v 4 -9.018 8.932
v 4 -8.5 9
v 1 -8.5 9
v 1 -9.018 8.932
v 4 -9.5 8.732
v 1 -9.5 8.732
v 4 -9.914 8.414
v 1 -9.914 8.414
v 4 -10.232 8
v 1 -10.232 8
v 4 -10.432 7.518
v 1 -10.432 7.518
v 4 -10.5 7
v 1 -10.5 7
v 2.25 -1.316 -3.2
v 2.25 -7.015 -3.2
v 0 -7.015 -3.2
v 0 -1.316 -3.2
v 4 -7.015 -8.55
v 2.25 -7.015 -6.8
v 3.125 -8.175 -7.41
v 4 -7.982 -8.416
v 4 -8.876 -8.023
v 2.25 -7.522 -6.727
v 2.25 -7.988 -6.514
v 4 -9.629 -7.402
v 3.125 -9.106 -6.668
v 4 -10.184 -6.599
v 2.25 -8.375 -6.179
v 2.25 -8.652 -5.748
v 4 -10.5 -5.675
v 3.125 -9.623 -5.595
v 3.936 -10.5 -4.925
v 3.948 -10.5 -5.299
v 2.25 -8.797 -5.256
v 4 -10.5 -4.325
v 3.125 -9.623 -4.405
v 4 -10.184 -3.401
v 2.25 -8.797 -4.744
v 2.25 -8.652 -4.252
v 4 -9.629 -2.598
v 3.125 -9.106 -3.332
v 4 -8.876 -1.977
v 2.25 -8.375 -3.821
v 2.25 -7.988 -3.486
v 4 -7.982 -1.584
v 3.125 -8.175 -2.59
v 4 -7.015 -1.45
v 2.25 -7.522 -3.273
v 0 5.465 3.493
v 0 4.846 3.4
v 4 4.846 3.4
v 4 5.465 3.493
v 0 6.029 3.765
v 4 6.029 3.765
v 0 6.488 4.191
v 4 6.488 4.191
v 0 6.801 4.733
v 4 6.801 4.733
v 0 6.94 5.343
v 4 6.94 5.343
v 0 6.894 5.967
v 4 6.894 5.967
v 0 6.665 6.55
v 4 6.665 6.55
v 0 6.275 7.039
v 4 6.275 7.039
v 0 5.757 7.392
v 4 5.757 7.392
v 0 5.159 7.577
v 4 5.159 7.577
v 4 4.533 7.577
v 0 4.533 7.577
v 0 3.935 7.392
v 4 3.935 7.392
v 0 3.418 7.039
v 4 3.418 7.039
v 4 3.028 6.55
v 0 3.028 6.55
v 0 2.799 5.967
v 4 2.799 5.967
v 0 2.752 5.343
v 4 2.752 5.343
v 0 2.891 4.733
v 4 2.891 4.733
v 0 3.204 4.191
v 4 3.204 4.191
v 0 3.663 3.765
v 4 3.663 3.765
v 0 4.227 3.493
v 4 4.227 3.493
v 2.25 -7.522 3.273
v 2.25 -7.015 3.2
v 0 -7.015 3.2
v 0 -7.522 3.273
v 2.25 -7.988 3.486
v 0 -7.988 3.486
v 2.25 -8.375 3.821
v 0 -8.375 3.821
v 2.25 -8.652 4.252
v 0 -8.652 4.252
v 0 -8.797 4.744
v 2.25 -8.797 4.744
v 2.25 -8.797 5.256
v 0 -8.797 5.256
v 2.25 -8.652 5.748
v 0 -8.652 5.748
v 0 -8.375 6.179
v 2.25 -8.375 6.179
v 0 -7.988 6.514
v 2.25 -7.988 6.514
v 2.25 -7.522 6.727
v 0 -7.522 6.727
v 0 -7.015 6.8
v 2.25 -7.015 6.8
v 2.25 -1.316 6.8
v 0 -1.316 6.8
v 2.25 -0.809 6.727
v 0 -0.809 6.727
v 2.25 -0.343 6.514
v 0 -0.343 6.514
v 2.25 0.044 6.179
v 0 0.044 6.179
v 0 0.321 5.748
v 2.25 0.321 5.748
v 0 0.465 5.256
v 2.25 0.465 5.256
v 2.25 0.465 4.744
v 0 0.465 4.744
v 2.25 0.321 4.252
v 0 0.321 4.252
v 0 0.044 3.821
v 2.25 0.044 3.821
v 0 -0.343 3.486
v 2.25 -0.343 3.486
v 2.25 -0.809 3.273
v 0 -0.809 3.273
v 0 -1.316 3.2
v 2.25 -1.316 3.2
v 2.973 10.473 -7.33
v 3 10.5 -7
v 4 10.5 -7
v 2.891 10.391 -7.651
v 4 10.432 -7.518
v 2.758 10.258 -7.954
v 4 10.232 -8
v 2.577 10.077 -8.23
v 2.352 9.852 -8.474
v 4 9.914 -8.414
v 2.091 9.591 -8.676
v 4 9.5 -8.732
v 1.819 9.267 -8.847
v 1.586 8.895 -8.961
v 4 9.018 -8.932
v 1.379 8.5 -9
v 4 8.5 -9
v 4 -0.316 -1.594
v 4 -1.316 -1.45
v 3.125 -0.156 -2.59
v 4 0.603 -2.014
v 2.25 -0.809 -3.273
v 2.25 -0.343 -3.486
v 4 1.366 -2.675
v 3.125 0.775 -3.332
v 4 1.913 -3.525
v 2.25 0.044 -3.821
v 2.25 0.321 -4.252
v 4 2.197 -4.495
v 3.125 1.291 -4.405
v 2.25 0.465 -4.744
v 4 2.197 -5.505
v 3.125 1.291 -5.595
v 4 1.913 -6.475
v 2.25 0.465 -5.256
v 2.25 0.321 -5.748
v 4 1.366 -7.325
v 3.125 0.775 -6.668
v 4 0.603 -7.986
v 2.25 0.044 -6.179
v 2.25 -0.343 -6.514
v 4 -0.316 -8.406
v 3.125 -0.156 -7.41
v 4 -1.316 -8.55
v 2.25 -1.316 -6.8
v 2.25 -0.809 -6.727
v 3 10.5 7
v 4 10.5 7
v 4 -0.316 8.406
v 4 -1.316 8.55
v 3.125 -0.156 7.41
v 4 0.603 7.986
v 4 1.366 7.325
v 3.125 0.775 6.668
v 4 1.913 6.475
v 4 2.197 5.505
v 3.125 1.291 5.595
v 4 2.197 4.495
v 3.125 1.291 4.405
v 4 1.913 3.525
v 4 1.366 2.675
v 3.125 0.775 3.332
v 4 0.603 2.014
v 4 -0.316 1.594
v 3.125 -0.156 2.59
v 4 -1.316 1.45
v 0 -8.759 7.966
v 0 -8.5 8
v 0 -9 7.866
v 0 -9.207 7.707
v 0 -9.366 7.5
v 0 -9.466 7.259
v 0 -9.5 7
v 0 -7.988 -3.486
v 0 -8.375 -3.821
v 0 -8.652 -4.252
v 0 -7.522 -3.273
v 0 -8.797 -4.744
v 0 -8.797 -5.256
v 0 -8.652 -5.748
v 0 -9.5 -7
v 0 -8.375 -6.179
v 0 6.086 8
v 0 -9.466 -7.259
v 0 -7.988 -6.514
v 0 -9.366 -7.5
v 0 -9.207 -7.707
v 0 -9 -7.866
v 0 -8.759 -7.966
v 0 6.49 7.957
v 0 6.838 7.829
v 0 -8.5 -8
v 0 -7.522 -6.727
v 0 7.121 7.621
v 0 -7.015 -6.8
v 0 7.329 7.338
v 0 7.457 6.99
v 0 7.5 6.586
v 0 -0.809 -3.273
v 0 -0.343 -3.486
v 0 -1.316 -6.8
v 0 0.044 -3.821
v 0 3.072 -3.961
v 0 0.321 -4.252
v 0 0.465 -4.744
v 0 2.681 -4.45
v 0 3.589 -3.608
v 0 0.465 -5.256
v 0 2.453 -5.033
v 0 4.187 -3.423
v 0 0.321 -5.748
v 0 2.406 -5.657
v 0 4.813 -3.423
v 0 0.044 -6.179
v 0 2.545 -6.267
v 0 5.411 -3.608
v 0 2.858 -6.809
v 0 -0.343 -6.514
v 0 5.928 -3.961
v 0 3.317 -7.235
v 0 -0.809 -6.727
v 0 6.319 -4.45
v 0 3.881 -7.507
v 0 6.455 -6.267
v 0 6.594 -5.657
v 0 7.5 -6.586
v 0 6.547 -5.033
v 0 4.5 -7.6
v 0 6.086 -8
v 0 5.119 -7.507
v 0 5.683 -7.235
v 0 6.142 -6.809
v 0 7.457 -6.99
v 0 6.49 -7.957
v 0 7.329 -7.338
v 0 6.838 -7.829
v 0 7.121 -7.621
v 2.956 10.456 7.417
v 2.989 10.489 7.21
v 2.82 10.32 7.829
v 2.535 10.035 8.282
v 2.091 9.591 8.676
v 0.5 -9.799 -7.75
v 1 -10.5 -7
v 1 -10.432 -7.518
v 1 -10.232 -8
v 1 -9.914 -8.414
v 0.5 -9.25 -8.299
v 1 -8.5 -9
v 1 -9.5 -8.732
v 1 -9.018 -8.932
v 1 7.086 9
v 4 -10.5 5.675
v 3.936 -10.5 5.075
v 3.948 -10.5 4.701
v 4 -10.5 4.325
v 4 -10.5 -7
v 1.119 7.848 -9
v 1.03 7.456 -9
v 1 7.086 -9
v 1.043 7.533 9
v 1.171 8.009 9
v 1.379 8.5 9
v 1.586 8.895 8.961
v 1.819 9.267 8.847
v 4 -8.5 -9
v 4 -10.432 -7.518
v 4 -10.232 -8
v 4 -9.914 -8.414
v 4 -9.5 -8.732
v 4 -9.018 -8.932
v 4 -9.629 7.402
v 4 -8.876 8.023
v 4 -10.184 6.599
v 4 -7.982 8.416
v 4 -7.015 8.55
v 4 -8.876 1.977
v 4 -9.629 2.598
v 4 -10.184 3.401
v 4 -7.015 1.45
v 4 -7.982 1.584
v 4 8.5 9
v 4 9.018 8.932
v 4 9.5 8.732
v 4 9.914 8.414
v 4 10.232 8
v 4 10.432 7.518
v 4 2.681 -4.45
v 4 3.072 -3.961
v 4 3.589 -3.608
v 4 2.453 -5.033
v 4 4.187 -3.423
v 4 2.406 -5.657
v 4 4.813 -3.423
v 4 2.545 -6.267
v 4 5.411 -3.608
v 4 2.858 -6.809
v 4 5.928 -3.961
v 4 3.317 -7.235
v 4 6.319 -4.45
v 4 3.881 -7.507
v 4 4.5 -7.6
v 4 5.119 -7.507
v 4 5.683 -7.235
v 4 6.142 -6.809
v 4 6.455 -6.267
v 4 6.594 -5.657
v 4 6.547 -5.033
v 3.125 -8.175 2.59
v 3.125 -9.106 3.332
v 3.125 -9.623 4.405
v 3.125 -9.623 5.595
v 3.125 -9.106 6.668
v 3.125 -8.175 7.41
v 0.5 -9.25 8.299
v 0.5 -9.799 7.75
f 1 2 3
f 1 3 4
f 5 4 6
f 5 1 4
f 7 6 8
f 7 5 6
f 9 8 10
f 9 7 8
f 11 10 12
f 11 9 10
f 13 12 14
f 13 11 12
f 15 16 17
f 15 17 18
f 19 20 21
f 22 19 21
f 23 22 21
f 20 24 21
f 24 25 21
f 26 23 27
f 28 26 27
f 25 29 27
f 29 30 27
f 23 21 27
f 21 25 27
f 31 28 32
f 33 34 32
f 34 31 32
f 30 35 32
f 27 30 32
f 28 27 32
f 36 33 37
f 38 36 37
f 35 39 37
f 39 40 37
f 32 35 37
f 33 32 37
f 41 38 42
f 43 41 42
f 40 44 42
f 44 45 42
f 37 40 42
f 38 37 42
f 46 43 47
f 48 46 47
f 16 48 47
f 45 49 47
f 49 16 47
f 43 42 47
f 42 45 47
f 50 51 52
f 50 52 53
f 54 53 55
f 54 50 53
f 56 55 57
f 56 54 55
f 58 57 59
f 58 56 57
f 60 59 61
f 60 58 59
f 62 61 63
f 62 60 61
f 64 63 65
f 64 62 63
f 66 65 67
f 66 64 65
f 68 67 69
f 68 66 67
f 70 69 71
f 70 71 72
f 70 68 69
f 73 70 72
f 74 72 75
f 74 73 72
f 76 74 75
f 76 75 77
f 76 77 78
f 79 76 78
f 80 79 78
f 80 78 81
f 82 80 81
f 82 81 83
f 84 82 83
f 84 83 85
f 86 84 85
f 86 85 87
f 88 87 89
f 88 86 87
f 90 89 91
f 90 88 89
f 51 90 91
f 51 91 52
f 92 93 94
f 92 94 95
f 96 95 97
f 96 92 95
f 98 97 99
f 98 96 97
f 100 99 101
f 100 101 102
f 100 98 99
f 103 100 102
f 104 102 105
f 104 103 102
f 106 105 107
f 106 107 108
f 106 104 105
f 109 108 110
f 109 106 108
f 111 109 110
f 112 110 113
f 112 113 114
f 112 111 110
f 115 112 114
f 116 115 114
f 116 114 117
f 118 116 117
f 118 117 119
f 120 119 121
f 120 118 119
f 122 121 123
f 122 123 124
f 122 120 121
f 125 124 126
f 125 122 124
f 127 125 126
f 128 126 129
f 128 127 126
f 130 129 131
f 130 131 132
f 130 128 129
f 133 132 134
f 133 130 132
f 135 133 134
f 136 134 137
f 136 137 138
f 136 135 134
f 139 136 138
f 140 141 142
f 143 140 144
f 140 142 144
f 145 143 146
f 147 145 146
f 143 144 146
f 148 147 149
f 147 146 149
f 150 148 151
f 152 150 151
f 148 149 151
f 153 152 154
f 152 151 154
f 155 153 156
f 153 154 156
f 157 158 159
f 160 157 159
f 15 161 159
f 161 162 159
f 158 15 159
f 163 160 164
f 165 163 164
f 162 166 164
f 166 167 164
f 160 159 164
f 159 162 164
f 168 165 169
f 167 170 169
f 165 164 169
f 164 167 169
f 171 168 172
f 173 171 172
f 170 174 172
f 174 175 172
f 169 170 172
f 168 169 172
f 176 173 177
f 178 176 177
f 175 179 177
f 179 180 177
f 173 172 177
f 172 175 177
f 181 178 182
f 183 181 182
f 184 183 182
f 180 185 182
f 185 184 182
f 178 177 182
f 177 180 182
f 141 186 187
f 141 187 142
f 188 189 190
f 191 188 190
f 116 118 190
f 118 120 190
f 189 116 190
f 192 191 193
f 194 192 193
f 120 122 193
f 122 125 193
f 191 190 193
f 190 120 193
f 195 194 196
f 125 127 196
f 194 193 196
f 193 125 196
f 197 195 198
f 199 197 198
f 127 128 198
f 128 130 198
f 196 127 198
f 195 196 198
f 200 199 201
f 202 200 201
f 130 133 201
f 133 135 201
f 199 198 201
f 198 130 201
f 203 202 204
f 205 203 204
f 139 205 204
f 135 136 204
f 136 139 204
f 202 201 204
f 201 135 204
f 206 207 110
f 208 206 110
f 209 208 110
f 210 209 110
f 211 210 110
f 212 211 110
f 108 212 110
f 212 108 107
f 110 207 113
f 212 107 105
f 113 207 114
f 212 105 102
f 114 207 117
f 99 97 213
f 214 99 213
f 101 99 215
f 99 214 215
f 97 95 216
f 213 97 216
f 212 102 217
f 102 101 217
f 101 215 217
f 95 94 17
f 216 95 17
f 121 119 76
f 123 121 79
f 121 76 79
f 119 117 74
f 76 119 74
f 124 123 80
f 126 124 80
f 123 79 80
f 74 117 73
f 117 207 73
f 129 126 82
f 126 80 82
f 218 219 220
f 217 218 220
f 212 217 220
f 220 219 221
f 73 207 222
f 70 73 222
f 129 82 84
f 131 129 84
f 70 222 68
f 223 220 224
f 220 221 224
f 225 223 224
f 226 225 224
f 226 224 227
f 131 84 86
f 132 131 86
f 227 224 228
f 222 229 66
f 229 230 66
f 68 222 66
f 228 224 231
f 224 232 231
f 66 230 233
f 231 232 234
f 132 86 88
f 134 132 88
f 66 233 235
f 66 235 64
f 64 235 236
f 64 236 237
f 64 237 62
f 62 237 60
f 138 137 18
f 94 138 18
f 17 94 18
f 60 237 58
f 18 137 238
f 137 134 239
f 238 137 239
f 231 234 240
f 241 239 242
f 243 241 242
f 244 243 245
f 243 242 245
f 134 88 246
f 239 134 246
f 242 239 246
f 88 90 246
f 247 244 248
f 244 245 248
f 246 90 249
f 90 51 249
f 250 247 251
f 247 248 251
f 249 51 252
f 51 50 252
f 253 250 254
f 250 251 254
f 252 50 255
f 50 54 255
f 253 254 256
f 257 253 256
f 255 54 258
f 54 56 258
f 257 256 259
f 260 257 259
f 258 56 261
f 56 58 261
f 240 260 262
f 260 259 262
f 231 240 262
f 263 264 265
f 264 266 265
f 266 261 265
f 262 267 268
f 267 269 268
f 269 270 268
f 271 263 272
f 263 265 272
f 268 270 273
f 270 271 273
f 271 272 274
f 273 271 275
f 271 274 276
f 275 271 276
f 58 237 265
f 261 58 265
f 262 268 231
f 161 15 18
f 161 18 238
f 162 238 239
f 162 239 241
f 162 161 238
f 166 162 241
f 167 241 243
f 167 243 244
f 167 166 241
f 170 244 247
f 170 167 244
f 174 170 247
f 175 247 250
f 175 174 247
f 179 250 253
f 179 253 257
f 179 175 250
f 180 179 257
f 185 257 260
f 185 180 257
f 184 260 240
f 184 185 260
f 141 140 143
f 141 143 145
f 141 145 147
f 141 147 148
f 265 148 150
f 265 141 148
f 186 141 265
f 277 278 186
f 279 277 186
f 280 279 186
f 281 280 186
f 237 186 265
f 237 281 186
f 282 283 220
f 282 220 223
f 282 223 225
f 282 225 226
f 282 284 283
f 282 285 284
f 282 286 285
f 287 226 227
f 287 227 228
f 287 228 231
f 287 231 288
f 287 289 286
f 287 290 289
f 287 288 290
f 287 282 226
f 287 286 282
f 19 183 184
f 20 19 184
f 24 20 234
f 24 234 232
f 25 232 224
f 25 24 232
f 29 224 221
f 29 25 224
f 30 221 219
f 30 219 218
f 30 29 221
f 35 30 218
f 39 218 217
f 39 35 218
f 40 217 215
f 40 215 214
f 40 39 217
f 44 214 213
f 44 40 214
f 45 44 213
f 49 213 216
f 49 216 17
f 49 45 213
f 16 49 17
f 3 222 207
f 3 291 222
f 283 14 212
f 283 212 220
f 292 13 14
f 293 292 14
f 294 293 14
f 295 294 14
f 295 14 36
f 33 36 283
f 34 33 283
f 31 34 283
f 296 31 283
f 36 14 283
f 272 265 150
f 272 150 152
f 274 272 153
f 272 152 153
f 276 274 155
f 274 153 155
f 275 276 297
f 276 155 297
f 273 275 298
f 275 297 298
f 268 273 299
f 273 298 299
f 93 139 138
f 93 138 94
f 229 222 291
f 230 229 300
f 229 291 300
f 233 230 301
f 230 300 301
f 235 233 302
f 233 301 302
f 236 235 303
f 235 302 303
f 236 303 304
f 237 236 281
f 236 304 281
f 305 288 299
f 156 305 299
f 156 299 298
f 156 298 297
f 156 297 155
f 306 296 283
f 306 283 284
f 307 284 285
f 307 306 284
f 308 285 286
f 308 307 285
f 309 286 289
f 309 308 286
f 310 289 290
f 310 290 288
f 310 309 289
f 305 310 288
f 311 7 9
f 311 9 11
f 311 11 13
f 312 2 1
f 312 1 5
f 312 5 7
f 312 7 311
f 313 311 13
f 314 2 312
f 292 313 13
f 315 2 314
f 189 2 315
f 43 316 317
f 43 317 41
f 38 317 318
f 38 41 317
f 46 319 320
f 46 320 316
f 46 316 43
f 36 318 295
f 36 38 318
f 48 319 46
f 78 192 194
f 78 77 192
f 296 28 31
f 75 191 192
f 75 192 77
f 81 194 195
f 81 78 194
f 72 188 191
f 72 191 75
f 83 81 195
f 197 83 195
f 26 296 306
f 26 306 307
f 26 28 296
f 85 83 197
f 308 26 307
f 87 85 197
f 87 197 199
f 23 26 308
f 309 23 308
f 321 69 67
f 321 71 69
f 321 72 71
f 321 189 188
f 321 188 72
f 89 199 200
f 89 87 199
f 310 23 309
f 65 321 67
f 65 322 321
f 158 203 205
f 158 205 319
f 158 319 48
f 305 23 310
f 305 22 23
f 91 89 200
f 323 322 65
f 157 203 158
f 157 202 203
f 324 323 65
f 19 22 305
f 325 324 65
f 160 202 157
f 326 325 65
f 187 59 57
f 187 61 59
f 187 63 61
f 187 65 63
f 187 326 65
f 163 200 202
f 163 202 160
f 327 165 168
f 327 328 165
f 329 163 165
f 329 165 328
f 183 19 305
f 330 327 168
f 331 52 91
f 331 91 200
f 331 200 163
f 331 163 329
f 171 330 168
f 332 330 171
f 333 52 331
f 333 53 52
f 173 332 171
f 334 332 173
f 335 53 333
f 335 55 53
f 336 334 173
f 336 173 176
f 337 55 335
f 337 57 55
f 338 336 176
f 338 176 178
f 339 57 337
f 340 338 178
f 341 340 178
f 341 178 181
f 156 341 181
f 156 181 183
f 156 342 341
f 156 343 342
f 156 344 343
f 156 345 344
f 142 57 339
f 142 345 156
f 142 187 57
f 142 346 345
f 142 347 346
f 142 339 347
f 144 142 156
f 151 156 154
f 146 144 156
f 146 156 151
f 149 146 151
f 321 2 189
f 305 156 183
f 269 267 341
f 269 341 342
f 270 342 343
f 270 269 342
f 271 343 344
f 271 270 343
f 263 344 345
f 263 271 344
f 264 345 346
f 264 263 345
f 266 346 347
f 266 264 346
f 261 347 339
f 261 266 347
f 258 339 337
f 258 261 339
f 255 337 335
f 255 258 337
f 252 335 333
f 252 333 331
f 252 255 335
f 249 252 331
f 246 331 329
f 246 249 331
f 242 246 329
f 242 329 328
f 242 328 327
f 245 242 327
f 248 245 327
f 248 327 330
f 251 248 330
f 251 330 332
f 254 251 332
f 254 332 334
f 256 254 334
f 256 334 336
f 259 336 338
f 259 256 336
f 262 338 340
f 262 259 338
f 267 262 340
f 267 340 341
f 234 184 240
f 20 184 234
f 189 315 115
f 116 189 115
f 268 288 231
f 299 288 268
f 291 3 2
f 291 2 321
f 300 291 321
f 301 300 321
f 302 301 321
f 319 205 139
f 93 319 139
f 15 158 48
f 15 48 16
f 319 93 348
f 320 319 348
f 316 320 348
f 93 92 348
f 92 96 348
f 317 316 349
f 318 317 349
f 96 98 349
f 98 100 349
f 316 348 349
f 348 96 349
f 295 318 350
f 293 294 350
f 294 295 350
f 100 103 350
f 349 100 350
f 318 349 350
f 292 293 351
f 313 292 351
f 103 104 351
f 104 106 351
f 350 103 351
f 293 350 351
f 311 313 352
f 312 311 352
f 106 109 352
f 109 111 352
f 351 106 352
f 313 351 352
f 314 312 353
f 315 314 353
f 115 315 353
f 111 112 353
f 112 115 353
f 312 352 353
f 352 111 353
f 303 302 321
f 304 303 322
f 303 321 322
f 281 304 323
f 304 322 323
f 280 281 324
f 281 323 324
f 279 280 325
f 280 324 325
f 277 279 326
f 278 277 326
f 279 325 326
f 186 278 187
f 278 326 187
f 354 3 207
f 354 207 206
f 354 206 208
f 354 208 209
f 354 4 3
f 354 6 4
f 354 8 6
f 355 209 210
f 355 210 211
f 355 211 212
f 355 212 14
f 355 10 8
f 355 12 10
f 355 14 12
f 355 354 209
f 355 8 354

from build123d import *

# Parameters (mm, degrees)
SKETCH1_W           = 18
SKETCH1_H           = 21
SKETCH1_R           = 2.1
BOSS_EXTRUDE1_DEPTH = 4
CUT_EXTRUDE1_DEPTH  = 4
CHAMFER1_SIZE       = 1.75
FILLET1_R           = 2
CHAMFER2_SIZE       = 3
CHAMFER3_SIZE       = 1
FILLET2_R           = 2


with BuildPart() as part:
    # Sketch1 → Boss-Extrude1 (new body)
    with BuildSketch(Plane(origin=(0, 0, 0), x_dir=(0, 0, -1), z_dir=(1, 0, 0))):
        Rectangle(SKETCH1_W, SKETCH1_H)
        with Locations((5.5, 4.5)):
            Circle(SKETCH1_R, mode=Mode.SUBTRACT)
        with Locations((-5.5, 4.846153846)):
            Circle(SKETCH1_R, mode=Mode.SUBTRACT)
    extrude(amount=BOSS_EXTRUDE1_DEPTH)

    # Sketch2 → Cut-Extrude1 (cut)
    with BuildSketch(Plane(origin=(4, 0, 0), x_dir=(0, 0, -1), z_dir=(1, 0, 0))):
        with BuildLine():
            Line((6.8, -1.316455335), (6.8, -7.014826284))
            ThreePointArc((6.8, -7.014826284), (5, -8.814826284), (3.2, -7.014826284))
            Line((3.2, -7.014826284), (3.2, -1.316455335))
            ThreePointArc((3.2, -1.316455335), (5, 0.483544665), (6.8, -1.316455335))
        make_face()
        with BuildLine():
            Line((-3.2, -1.316455335), (-3.2, -7.014826284))
            ThreePointArc((-3.2, -7.014826284), (-5, -8.814826284), (-6.8, -7.014826284))
            Line((-6.8, -7.014826284), (-6.8, -1.316455335))
            ThreePointArc((-6.8, -1.316455335), (-5, 0.483544665), (-3.2, -1.316455335))
        make_face()
    extrude(amount=-CUT_EXTRUDE1_DEPTH, mode=Mode.SUBTRACT)

    # Chamfer1
    # the kernel refuses this chamfer: 1.75 mm, written as the material it takes off along each edge
    with BuildSketch(Plane(origin=(4, -1.316455335, -5), x_dir=(0, 0, 1), z_dir=(0, -1, 0))) as chamfer1_piece_1:
        Polygon((1.8 + CHAMFER1_SIZE, 0), (1.8, CHAMFER1_SIZE), (1.8, 0), align=None)
    revolve(axis=Axis((4, -1.316455335, -5), (-1, 0, 0)), revolution_arc=180, mode=Mode.SUBTRACT)
    with BuildSketch(Plane(origin=(4, -7.014826284, -3.2), x_dir=(0.02749587661058661, 0, 0.9996219169112968), z_dir=(0, 1, 0)), Plane(origin=(4, -1.316455335, -6.8), x_dir=(0.027495876610586112, 0, -0.9996219169112968), z_dir=(0, -1, 0)), Plane(origin=(4, -7.014826284, 6.8), x_dir=(0.02749587661058662, 0, 0.9996219169112968), z_dir=(0, 1, 0)), Plane(origin=(4, -1.316455335, 3.2), x_dir=(0.02749587661058661, 0, -0.9996219169112968), z_dir=(0, -1, 0))) as chamfer1_piece_2:
        Polygon((CHAMFER1_SIZE * 0.999621916911, -CHAMFER1_SIZE * 0.0274958766106), (-CHAMFER1_SIZE * 0.0274958766106, -CHAMFER1_SIZE * 0.999621916911), (0, 0), align=None)
    extrude(amount=5.698370949, mode=Mode.SUBTRACT)
    with BuildSketch(Plane(origin=(4, -7.014826284, -5), x_dir=(0, 0, -1), z_dir=(0, 1, 0))) as chamfer1_piece_3:
        Polygon((1.8 + CHAMFER1_SIZE, 0), (1.8, CHAMFER1_SIZE), (1.8, 0), align=None)
    revolve(axis=Axis((4, -7.014826284, -5), (-1, 0, 0)), revolution_arc=180, mode=Mode.SUBTRACT)
    with BuildSketch(Plane(origin=(4, -1.316455335, 5), x_dir=(0, 0, 1), z_dir=(0, -1, 0))) as chamfer1_piece_4:
        Polygon((1.8 + CHAMFER1_SIZE, 0), (1.8, CHAMFER1_SIZE), (1.8, 0), align=None)
    revolve(axis=Axis((4, -1.316455335, 5), (-1, 0, 0)), revolution_arc=180, mode=Mode.SUBTRACT)
    with BuildSketch(Plane(origin=(4, -7.014826284, 5), x_dir=(0, 0, -1), z_dir=(0, 1, 0))) as chamfer1_piece_5:
        Polygon((1.8 + CHAMFER1_SIZE, 0), (1.8, CHAMFER1_SIZE), (1.8, 0), align=None)
    revolve(axis=Axis((4, -7.014826284, 5), (-1, 0, 0)), revolution_arc=180, mode=Mode.SUBTRACT)

    # Fillet1
    fillet1_edges = [part.edges().sort_by_distance(p)[0] for p in [
        (2, -10.5, -9),
        (2, -10.5, 9),
        (2, 10.5, 9),
        (2, 10.5, -9),
    ]]
    fillet(fillet1_edges, radius=FILLET1_R)

    # Chamfer2
    # the kernel refuses this chamfer: 3 mm, written as the material it takes off along each edge
    with BuildSketch(Plane(origin=(0, 10.5, 14.715048964), x_dir=(0.9996219169112968, 0.027495876610586202, 0), z_dir=(0, 0, -1))) as chamfer2_piece_1:
        Polygon((CHAMFER2_SIZE * 0.999621916911, CHAMFER2_SIZE * 0.0274958766106), (-CHAMFER2_SIZE * 0.0274958766106, CHAMFER2_SIZE * 0.999621916911), (0, 0), align=None)
    extrude(amount=29.430097928, mode=Mode.SUBTRACT)

    # Chamfer3
    chamfer3_edges = [part.edges().sort_by_distance(p)[0] for p in [
        (0, -0.5, -9),
        (0, -9.914213562, -8.414213562),
        (0, -10.5, 0),
        (0, -9.914213562, 8.414213562),
        (0, -0.5, 9),
    ]]
    chamfer(chamfer3_edges, length=CHAMFER3_SIZE)

    # Fillet2
    fillet2_edges = [part.edges().sort_by_distance(p)[0] for p in [
        (0.5, 8, -8.5),
        (0.5, 8, 8.5),
    ]]
    fillet(fillet2_edges, radius=FILLET2_R)


solid = part.part
